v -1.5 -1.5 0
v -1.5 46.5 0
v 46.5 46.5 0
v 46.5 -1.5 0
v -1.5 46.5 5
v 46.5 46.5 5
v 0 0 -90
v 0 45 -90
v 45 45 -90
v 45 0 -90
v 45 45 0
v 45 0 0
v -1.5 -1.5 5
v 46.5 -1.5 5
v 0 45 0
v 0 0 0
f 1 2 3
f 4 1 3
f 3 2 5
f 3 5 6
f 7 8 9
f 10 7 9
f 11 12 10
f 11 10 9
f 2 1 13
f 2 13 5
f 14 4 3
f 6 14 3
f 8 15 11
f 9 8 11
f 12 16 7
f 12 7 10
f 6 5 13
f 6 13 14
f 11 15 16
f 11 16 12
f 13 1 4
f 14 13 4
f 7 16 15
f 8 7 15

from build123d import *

# Parameters (mm, degrees)
SKETCH1_W           = 48
SKETCH1_H           = 48
BOSS_EXTRUDE1_DEPTH = 5
SKETCH1_2_W         = 45
SKETCH1_2_H         = 45
BOSS_EXTRUDE2_DEPTH = 90


with BuildPart() as part:
    # Sketch1 → Boss-Extrude1 (new body)
    with BuildSketch(Plane.XY):
        with Locations((22.5, 22.5)):
            Rectangle(SKETCH1_W, SKETCH1_H)
    extrude(amount=BOSS_EXTRUDE1_DEPTH)


with BuildPart() as body_2:
    # Sketch1<2> → Boss-Extrude2 (new body)
    with BuildSketch(Plane.XY):
        with Locations((22.5, 22.5)):
            Rectangle(SKETCH1_2_W, SKETCH1_2_H)
    extrude(amount=-BOSS_EXTRUDE2_DEPTH)


solid = Compound([part.part, body_2.part])
